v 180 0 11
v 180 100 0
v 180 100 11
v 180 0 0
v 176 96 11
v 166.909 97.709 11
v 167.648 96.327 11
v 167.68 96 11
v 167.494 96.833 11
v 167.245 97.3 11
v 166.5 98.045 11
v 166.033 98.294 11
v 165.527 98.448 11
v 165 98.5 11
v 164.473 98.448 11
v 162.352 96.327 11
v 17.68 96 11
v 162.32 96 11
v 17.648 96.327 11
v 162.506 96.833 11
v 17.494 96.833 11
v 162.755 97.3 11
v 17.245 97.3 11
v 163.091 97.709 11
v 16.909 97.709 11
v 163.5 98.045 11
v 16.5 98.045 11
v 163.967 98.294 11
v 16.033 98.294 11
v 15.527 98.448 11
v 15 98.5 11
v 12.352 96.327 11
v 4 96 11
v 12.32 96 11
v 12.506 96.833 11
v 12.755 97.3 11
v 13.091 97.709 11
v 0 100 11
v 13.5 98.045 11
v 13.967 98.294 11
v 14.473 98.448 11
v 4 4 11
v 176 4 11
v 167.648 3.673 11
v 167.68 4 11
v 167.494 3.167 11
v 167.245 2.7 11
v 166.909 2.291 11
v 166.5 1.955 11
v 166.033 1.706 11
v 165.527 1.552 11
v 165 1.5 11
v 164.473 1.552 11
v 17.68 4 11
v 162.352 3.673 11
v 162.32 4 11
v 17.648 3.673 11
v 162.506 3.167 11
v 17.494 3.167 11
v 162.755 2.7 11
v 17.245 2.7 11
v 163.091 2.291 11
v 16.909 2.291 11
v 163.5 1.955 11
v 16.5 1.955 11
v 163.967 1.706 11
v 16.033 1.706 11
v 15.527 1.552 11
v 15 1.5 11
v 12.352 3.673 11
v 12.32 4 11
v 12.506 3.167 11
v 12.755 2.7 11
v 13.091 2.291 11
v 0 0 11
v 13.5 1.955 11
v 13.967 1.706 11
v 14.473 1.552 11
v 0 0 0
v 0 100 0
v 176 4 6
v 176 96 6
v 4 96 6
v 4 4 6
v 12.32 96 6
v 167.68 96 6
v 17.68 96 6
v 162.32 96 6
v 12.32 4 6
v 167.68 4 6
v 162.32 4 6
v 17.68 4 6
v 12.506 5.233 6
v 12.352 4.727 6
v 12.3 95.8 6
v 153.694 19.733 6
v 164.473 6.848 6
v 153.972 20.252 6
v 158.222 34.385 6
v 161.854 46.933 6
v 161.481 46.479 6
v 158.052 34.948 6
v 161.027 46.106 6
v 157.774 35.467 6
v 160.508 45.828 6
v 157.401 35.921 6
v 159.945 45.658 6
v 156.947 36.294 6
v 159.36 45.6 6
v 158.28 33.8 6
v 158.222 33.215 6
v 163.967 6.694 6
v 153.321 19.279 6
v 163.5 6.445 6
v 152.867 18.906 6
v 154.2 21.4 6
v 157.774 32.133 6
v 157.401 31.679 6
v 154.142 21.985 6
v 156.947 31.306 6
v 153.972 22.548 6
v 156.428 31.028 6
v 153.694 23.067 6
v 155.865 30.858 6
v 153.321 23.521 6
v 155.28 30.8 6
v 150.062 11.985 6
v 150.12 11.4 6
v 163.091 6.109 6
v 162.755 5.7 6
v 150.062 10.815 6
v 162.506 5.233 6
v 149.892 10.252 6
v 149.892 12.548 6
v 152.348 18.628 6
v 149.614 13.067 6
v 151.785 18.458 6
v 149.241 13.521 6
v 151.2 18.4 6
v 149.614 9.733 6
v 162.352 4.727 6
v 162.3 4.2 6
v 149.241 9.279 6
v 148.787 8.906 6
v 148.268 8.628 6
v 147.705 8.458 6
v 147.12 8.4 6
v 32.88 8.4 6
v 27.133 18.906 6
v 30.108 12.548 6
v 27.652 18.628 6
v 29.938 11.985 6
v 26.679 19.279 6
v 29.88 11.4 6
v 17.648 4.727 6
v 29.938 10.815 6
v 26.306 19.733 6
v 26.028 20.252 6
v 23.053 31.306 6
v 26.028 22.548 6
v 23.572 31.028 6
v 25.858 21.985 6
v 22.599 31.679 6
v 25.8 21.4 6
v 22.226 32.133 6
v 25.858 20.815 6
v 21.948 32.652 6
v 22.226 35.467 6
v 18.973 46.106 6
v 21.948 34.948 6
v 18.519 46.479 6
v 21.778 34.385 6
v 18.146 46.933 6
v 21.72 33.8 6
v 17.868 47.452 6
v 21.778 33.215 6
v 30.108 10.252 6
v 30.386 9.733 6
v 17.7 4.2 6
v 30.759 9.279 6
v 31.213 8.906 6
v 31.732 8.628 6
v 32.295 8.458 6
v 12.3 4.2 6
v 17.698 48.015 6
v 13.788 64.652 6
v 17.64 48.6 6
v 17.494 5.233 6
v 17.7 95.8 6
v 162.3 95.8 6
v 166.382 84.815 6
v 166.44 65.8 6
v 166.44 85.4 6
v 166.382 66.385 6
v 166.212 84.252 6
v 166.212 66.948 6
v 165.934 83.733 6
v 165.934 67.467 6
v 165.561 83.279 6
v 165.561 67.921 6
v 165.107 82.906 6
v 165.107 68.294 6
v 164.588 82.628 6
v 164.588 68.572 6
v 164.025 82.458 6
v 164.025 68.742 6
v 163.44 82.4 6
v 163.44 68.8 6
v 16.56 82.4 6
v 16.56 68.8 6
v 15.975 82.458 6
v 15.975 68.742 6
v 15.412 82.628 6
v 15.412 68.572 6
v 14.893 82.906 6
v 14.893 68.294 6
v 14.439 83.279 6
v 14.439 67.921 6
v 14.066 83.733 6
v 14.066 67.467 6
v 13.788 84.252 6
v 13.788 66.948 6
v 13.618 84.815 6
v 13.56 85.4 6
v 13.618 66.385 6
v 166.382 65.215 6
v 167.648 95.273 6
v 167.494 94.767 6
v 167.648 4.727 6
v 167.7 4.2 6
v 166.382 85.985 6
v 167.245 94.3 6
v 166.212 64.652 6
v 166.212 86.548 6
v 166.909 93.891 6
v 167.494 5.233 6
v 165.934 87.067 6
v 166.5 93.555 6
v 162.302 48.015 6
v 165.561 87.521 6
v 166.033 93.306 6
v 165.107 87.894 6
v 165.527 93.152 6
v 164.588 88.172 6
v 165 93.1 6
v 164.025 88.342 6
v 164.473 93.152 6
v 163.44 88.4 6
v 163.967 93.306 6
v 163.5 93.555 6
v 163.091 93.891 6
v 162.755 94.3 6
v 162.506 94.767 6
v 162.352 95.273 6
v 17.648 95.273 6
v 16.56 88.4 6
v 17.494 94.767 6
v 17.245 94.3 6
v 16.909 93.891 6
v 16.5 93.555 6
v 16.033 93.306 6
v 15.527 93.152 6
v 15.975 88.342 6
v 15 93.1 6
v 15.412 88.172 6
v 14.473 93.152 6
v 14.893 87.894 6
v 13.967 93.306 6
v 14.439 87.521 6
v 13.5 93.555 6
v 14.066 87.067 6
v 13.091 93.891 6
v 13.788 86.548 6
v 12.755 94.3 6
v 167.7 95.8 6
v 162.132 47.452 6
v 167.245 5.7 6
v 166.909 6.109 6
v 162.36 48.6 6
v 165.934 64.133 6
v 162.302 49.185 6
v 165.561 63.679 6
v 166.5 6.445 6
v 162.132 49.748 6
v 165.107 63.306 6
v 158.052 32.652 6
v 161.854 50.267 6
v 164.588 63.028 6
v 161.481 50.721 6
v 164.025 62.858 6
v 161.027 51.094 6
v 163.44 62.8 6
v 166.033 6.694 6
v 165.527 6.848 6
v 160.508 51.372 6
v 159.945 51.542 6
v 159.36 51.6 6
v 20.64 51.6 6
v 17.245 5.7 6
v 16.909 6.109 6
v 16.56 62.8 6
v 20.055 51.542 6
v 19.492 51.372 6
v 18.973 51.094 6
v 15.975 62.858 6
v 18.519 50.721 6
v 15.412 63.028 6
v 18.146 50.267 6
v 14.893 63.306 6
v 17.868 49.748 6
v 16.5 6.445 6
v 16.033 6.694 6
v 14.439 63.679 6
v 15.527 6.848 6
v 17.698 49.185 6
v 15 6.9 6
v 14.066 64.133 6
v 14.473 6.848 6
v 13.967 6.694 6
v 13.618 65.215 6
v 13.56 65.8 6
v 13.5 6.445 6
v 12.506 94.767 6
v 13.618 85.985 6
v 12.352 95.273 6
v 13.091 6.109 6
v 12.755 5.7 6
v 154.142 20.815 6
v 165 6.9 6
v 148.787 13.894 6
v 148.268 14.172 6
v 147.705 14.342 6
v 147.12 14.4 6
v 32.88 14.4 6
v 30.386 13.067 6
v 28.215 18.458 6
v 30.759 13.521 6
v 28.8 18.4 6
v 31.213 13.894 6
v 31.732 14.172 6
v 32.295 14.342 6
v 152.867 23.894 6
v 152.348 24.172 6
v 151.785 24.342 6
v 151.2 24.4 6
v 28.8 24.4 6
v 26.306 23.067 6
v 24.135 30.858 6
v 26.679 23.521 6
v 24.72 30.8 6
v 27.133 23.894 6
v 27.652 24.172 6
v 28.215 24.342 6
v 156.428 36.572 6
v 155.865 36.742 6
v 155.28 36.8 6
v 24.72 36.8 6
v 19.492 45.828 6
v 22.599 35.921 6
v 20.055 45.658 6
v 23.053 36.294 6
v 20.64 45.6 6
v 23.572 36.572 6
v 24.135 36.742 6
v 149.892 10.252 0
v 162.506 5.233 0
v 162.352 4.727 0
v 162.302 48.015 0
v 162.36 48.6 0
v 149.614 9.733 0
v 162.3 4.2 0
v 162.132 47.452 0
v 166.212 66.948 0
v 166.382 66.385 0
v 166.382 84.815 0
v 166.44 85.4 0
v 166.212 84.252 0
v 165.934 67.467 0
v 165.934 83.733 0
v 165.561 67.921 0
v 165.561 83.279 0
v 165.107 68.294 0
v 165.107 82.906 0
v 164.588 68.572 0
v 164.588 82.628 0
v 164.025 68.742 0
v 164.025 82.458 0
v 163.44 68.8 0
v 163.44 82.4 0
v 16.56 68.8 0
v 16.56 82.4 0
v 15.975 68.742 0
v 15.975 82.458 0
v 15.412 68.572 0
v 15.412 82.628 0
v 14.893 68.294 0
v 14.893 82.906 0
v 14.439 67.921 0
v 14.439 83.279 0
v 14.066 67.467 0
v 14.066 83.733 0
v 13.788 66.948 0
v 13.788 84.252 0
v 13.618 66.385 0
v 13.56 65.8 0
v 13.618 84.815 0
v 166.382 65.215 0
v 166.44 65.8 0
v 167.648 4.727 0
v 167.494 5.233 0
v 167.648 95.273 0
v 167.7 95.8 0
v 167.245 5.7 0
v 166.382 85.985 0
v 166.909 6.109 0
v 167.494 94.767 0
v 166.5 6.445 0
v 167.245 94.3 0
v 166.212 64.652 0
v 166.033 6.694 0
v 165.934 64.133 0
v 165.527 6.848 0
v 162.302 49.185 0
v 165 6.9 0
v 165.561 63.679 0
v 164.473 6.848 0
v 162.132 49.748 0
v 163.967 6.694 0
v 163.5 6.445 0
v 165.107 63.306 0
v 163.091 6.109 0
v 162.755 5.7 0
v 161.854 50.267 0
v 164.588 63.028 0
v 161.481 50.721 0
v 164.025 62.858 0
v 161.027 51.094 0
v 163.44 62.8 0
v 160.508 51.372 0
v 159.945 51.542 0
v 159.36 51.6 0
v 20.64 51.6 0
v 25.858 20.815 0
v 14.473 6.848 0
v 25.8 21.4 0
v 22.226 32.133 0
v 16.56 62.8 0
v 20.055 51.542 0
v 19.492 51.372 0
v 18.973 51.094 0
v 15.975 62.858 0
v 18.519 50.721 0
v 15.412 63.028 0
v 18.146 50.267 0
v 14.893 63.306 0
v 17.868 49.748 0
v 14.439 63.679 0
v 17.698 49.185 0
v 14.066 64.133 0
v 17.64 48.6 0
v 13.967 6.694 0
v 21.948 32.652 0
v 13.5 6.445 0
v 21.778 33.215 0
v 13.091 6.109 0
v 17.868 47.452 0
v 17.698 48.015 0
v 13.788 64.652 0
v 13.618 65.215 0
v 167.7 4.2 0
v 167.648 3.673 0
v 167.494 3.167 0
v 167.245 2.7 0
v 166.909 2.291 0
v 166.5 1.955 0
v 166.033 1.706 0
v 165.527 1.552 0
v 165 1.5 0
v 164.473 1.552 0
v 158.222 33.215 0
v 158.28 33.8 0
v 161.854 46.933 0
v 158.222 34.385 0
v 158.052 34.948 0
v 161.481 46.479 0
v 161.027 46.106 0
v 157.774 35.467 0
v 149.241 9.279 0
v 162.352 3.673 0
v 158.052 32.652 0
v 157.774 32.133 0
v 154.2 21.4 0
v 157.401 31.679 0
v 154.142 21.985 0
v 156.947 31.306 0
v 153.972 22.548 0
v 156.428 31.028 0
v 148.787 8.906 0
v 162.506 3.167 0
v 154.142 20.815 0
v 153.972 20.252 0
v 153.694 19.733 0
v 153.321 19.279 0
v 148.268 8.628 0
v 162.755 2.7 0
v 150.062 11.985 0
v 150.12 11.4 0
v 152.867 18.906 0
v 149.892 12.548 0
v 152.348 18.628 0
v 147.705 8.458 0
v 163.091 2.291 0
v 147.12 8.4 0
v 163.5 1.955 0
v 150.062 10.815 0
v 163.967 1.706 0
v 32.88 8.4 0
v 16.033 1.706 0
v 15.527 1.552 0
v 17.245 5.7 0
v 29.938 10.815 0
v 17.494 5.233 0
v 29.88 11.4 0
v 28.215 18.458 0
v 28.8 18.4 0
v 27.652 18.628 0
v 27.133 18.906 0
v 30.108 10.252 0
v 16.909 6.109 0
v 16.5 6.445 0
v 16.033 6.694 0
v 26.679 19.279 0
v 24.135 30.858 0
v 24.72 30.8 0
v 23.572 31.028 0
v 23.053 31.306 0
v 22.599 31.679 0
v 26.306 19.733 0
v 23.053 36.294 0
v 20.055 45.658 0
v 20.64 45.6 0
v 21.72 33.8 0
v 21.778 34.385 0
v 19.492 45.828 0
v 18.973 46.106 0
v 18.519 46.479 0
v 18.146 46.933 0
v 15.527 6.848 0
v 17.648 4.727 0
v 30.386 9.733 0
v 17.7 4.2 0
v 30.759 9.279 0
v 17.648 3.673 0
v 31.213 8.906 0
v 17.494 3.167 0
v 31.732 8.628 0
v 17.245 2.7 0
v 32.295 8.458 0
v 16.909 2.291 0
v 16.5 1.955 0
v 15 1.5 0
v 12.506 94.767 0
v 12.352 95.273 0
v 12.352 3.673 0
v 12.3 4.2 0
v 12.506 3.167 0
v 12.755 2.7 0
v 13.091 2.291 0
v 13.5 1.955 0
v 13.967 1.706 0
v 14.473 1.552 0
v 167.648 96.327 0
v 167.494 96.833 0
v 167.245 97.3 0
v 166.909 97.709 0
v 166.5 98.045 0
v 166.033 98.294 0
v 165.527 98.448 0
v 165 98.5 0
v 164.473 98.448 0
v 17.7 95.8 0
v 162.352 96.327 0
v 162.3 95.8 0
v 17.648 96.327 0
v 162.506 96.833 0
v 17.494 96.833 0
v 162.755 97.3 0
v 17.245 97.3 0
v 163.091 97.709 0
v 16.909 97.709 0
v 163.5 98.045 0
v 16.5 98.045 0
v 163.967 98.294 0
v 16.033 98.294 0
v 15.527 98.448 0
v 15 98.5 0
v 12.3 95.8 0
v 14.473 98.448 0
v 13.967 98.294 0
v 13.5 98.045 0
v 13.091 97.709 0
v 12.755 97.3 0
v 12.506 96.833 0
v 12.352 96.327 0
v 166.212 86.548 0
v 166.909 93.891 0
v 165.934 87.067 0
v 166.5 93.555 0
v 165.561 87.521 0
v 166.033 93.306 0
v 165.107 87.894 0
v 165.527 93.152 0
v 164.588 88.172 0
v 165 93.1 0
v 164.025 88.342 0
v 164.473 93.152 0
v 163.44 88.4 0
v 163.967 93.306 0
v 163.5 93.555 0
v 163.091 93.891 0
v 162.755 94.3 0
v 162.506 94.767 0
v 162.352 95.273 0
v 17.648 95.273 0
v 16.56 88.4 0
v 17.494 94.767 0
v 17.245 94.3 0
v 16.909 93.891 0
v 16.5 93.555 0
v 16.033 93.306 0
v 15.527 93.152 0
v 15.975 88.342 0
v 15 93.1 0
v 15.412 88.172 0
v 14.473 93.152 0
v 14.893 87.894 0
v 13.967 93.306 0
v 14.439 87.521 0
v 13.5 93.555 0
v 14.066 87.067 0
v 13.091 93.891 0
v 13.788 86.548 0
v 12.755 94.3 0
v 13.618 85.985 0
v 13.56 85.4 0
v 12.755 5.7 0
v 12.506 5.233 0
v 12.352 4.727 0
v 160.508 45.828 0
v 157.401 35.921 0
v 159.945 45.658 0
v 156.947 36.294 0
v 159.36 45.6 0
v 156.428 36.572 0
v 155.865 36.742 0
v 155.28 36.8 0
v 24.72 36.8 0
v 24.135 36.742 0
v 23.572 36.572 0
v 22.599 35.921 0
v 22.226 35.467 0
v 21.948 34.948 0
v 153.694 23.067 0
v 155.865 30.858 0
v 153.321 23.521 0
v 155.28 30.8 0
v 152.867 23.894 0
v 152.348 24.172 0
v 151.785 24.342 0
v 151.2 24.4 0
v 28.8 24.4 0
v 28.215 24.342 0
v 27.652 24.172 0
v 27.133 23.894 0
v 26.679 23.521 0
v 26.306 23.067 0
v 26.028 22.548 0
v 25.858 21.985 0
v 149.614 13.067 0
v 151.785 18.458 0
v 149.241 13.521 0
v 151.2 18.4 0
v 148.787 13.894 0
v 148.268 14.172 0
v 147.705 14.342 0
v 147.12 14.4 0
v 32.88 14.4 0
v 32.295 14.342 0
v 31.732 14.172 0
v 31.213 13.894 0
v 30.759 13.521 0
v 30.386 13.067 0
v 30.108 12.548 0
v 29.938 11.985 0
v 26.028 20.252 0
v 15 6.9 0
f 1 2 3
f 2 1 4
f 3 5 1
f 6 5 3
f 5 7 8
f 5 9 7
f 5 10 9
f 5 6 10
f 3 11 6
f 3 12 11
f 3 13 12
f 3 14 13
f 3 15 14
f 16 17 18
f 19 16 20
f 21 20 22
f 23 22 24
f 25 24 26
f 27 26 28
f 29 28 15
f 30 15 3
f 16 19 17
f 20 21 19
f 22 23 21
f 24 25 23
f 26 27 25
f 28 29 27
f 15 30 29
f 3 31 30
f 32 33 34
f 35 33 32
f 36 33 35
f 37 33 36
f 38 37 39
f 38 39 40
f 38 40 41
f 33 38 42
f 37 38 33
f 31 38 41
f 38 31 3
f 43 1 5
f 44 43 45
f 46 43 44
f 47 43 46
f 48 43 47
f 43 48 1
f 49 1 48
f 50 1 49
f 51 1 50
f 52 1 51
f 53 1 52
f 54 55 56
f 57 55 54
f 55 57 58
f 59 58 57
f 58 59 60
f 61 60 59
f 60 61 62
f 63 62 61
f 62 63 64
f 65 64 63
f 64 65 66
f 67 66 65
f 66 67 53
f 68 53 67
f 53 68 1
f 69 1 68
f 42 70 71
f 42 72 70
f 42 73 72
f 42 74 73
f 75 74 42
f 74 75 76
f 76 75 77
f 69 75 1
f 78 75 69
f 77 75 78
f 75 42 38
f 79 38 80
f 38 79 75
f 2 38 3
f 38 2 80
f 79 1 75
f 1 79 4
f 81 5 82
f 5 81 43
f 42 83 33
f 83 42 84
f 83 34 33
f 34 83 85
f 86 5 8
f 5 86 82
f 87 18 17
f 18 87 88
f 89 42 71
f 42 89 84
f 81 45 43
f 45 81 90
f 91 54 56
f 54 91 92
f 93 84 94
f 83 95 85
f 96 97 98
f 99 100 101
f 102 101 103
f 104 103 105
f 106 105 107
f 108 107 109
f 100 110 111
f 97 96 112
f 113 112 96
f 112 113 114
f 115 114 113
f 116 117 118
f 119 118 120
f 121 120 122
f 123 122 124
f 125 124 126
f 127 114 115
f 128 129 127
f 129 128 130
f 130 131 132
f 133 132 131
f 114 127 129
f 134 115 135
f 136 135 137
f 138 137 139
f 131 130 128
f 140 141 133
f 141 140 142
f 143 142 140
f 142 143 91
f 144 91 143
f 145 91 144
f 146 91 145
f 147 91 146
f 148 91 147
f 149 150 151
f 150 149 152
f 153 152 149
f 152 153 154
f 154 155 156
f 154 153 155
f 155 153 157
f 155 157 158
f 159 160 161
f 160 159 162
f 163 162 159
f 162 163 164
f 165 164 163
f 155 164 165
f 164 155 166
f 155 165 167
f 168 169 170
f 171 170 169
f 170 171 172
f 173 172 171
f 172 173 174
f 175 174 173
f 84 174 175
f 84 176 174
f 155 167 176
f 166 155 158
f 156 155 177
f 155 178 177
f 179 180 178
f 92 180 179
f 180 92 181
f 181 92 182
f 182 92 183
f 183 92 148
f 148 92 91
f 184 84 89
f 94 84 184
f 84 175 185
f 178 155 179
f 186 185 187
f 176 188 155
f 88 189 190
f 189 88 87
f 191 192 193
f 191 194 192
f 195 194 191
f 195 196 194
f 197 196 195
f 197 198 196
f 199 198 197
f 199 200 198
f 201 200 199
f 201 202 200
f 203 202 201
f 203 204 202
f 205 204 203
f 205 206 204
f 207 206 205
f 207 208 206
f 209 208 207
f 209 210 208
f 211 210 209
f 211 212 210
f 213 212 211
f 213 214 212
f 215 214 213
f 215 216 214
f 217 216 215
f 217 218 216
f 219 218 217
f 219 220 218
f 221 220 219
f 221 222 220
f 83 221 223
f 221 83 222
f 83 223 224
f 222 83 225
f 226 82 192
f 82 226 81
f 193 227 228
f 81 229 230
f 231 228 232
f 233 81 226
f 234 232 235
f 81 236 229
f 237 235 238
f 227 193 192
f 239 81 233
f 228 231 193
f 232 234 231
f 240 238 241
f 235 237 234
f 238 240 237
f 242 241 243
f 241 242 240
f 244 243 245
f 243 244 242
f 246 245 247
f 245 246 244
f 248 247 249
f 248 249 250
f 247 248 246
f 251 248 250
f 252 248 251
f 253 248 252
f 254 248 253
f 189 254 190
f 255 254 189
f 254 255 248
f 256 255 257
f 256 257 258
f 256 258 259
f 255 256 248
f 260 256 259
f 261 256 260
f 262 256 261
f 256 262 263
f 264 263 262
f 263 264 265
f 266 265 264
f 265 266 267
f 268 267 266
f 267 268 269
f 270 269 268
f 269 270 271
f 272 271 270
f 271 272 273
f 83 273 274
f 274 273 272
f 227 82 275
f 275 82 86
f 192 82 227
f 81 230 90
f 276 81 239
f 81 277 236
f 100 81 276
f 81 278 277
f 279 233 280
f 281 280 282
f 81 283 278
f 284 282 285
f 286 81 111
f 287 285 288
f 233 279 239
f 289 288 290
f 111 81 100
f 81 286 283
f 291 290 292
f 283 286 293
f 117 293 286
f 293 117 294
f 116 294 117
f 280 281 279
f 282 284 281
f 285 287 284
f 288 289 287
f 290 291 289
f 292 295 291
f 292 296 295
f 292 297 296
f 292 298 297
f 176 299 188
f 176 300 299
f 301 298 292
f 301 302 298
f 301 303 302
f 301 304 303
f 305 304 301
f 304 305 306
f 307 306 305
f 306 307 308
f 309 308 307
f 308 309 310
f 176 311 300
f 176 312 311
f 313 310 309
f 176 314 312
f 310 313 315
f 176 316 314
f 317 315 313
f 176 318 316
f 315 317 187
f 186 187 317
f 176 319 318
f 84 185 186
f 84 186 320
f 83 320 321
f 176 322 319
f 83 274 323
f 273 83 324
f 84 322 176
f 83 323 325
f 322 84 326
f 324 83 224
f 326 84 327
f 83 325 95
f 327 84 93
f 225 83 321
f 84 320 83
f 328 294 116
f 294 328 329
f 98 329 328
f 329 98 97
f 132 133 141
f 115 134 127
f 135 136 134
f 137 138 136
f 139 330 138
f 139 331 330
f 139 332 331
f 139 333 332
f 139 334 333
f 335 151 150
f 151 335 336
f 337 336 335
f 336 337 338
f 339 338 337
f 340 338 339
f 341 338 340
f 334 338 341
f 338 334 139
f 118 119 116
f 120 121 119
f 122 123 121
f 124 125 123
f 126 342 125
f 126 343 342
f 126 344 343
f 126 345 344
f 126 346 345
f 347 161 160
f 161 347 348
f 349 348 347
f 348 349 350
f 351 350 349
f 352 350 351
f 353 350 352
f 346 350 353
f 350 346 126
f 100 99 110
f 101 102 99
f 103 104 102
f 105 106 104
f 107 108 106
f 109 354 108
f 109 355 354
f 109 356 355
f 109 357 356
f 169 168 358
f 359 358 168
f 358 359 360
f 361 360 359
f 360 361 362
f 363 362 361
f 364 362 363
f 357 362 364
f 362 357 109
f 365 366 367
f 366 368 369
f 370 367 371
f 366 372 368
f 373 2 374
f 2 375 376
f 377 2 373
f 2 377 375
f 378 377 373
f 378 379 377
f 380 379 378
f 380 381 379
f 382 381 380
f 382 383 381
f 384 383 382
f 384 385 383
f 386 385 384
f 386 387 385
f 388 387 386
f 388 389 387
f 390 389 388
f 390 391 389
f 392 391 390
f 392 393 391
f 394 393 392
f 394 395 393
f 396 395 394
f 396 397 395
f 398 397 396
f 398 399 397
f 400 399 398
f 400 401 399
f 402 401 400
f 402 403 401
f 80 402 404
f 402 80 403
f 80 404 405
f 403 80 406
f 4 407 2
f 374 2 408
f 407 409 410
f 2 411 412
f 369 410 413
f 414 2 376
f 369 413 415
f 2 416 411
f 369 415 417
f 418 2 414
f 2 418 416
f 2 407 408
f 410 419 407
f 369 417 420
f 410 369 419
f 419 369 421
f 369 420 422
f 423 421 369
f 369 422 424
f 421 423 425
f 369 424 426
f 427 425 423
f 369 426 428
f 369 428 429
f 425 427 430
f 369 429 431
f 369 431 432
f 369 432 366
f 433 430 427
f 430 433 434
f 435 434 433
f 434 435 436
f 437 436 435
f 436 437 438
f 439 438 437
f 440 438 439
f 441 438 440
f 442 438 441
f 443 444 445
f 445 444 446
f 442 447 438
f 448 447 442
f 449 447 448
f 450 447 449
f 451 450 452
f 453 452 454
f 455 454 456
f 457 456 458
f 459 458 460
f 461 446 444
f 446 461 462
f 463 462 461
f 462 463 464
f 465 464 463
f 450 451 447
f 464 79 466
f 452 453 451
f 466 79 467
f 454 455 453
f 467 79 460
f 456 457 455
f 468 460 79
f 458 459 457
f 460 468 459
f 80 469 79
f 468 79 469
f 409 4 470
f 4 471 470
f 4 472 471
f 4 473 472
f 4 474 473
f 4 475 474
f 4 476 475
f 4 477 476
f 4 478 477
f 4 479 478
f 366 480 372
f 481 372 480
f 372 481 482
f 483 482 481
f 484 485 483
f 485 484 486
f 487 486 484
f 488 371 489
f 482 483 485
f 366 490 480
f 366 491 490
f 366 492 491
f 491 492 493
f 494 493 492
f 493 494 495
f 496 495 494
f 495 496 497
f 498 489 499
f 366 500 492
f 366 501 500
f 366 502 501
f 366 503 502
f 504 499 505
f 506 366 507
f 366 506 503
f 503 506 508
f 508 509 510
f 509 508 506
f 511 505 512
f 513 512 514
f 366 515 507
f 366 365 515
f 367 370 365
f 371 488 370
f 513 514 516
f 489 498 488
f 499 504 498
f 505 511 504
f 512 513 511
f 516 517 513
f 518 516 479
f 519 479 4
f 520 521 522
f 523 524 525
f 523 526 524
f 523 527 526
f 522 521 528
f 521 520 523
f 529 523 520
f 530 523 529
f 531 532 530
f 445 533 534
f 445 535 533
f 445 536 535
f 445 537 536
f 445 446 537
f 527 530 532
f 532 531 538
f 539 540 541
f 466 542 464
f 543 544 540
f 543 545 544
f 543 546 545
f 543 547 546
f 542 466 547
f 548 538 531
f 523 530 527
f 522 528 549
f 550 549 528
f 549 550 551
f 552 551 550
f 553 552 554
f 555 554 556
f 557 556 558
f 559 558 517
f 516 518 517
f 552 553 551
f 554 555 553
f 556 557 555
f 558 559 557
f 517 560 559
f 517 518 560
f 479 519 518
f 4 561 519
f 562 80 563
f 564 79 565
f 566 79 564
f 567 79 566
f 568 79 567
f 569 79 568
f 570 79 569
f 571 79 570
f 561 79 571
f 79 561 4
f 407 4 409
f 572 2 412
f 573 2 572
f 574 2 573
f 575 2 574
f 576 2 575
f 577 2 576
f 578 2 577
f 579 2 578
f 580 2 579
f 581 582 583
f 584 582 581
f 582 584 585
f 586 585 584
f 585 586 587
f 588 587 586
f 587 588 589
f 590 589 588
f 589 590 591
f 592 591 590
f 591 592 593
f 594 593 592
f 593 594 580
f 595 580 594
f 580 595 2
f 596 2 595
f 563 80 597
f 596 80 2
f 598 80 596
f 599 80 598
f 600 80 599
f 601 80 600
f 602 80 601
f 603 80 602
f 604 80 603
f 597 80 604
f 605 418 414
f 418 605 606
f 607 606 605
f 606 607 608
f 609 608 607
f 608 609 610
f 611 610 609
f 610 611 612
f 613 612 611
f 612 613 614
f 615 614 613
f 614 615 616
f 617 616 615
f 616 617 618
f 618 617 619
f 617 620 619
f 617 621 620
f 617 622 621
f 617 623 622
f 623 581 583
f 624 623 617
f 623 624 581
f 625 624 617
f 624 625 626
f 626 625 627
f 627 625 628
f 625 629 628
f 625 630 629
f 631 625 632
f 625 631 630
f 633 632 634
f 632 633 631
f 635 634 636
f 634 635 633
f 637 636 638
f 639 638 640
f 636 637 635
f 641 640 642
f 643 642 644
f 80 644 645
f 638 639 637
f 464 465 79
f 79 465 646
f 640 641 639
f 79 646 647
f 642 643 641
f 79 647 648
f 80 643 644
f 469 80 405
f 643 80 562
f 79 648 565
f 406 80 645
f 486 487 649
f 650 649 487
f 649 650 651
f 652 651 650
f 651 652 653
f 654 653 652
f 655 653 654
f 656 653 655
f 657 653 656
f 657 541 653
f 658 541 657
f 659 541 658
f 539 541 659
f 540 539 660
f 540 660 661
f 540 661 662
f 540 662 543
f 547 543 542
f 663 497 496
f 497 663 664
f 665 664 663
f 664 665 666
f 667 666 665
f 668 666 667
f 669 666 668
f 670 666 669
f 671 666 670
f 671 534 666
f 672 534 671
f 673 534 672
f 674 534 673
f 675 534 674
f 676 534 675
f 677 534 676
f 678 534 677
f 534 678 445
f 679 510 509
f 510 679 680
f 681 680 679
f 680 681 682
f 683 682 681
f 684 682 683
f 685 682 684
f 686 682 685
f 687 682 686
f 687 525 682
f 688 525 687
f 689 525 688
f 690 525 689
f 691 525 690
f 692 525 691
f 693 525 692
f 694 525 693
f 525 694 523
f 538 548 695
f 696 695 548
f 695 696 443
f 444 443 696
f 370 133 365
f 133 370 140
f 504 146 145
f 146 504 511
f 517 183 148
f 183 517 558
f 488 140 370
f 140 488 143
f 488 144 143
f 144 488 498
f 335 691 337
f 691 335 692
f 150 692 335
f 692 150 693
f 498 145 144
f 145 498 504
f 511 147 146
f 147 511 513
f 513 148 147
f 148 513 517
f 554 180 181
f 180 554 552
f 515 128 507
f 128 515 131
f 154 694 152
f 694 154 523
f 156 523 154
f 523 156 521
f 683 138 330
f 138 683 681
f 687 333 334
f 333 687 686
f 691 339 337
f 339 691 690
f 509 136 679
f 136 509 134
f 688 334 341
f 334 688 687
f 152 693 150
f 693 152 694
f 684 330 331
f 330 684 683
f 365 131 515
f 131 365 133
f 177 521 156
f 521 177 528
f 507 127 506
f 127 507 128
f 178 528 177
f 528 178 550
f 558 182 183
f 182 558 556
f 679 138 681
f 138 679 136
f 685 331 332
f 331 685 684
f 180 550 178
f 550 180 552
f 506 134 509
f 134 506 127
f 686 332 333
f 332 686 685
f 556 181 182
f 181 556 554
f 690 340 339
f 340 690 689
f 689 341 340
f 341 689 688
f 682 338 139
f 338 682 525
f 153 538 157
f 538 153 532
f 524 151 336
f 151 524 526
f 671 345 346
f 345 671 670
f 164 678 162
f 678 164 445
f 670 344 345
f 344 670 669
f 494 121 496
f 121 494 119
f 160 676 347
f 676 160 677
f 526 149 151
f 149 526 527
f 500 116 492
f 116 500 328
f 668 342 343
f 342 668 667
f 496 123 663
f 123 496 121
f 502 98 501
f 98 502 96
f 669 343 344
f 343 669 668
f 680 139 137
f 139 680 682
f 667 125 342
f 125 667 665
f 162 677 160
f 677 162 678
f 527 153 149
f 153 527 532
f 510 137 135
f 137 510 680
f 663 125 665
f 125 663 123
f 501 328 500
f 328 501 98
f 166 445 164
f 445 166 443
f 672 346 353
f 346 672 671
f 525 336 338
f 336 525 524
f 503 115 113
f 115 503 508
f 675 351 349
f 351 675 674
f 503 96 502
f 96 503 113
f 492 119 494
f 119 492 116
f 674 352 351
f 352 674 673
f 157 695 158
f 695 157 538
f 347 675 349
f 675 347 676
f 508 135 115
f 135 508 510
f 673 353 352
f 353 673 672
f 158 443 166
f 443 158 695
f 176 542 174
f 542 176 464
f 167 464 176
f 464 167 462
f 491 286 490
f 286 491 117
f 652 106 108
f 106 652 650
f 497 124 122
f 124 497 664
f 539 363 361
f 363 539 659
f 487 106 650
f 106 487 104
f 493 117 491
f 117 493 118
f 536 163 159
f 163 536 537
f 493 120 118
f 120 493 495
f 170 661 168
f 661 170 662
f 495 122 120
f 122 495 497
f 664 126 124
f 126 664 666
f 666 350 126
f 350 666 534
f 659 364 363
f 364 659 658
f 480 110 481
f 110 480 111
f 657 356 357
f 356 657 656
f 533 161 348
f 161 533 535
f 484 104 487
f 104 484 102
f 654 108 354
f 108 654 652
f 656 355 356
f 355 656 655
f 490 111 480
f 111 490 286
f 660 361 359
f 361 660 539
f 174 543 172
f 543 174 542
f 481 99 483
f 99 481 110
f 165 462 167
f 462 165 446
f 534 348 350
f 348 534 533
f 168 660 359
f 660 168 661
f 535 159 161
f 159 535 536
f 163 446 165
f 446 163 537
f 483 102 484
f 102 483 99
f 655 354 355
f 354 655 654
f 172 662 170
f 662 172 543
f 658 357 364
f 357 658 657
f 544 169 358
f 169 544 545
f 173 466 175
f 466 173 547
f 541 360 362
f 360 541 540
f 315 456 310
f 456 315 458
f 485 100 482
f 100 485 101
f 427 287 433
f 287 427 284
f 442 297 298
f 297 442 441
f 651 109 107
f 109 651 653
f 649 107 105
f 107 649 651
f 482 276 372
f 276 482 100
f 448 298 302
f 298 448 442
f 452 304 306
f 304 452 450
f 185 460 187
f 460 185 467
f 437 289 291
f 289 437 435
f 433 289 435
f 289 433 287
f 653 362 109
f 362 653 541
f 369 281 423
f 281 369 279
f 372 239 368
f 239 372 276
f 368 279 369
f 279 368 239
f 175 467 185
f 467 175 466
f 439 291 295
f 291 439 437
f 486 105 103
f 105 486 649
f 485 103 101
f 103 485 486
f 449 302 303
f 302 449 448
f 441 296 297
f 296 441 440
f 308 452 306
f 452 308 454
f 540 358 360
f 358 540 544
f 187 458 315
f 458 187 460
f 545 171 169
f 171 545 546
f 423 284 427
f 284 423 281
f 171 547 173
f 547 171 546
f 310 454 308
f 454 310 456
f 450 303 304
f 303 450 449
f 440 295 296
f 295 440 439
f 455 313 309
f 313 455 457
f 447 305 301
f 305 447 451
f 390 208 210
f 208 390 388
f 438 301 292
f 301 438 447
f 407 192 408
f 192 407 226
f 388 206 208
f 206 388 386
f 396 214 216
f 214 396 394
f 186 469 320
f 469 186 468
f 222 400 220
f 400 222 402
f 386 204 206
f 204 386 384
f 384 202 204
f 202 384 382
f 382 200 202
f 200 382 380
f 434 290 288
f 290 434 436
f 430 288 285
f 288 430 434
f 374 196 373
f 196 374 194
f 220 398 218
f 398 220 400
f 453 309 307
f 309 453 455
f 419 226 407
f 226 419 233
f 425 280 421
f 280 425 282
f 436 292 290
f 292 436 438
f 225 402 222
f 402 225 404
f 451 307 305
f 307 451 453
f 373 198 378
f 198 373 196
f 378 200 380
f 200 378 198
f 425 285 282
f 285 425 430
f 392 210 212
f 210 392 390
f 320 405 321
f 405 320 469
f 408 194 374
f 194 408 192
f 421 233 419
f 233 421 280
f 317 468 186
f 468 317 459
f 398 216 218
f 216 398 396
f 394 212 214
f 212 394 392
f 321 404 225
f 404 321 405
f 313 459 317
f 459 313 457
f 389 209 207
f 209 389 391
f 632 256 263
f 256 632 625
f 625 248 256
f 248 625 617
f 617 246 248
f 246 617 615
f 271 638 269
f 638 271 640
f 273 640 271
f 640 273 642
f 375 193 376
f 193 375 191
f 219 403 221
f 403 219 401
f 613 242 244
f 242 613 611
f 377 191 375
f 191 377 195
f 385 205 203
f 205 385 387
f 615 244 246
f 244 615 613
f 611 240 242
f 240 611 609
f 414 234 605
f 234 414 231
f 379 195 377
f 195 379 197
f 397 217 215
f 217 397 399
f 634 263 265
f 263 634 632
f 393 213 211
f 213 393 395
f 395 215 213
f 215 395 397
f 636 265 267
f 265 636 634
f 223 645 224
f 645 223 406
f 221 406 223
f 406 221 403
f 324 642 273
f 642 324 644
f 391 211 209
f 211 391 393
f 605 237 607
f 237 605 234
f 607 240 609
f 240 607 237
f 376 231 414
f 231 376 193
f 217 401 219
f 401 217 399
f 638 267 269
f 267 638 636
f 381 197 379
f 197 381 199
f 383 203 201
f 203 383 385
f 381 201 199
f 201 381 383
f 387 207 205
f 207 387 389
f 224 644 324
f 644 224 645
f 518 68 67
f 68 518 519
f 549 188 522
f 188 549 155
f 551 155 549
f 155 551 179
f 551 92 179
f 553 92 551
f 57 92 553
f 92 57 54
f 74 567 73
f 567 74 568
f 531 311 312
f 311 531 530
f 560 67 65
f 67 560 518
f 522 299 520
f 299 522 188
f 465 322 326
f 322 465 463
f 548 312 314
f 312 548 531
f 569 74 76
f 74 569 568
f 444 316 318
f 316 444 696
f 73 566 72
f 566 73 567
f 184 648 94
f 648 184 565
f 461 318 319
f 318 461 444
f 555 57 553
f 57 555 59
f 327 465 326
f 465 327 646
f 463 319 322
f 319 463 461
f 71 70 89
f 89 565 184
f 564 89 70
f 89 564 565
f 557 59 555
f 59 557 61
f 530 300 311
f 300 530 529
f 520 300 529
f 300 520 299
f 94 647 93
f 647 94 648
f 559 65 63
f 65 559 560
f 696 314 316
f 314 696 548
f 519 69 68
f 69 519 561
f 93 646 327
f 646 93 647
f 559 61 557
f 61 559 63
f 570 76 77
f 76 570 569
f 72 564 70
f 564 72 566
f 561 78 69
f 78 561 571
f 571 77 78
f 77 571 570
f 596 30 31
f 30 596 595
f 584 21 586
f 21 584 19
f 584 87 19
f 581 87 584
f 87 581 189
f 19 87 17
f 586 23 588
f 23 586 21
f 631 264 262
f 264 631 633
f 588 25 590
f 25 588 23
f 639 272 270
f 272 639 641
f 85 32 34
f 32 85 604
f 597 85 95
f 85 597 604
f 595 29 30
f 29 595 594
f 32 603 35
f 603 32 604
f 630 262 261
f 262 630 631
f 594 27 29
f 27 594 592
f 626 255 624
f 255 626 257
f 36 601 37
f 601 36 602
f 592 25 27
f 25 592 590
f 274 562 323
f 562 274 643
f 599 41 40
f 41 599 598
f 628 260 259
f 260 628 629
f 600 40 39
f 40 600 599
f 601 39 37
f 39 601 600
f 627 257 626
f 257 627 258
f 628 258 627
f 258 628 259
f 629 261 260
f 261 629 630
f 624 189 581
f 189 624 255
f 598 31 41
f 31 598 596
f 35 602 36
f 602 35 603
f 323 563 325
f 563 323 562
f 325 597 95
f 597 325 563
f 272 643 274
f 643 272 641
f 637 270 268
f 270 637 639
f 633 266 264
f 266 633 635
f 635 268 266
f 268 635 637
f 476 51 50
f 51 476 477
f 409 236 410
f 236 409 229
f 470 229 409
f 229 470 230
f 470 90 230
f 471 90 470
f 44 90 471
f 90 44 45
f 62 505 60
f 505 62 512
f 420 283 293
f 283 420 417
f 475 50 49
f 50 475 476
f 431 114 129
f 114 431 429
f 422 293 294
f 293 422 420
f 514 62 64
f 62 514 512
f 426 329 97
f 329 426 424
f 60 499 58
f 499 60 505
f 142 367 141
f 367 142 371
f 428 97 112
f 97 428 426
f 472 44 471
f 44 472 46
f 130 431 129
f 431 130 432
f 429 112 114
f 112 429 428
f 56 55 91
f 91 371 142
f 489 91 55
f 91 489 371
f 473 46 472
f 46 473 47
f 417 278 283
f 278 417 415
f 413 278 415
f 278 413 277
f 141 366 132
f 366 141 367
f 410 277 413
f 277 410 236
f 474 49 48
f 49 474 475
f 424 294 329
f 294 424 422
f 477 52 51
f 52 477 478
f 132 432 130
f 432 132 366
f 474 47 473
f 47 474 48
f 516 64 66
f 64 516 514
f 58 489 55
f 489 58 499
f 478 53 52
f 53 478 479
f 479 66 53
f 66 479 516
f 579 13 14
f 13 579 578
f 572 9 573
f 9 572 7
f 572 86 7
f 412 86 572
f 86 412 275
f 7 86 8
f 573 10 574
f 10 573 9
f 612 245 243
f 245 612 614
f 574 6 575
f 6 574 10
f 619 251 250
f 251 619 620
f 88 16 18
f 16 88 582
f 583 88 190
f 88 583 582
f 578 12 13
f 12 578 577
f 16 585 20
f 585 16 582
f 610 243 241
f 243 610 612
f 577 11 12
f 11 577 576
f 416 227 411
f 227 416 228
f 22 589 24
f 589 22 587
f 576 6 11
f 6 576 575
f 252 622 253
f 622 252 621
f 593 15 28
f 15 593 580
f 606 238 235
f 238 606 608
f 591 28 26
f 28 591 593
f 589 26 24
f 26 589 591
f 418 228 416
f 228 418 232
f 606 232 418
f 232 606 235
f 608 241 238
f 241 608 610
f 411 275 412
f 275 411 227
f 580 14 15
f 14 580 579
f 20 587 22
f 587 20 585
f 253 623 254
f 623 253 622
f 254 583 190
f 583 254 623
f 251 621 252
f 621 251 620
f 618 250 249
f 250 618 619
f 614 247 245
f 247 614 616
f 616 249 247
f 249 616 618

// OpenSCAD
$fn = 32;

// ----------------------------------------------------------------------
// Slotted panel: 180 x 100 mm, 6 рядов of slots
// ----------------------------------------------------------------------

// --- parameters (mm) ---
panel_w = 180;            // panel width
panel_d = 100;            // panel depth
thick = 6;                // panel thickness
slot_w = 6;               // slot width
pitch0 = 10;              // first row pitch
pitch_step = 2.4;         // pitch increase per row
margin = 8.4;             // margin around the slot field
rows = 6;                 // number of slot rows
mount_d = 5.4;            // mounting holes
mount_x = 75;             // mounting hole offset
rim_h = 11;               // rim height
rim_t = 4;                // rim wall thickness

difference() {
  union() {
    cube([panel_w, panel_d, thick]);
    translate([0, 0, thick - 1]) difference() {
      cube([panel_w, panel_d, rim_h - thick + 1]);
      translate([rim_t, rim_t, -2.5]) cube([panel_w - 2 * rim_t, panel_d - 2 * rim_t, rim_h - thick + 6]);
    }
  }
  /* slot rows: stadium shaped cutters, 2.5 mm clear of both faces */
  /* row 0: pitch 10, length 114.24 */
  hull() {
    translate([32.88, 11.4, -2.5]) cylinder(h = thick + 5, d = slot_w);
    translate([147.12, 11.4, -2.5]) cylinder(h = thick + 5, d = slot_w);
  }
  /* row 1: pitch 12.4, length 122.4 */
  hull() {
    translate([28.8, 21.4, -2.5]) cylinder(h = thick + 5, d = slot_w);
    translate([151.2, 21.4, -2.5]) cylinder(h = thick + 5, d = slot_w);
  }
  /* row 2: pitch 14.8, length 130.56 */
  hull() {
    translate([24.72, 33.8, -2.5]) cylinder(h = thick + 5, d = slot_w);
    translate([155.28, 33.8, -2.5]) cylinder(h = thick + 5, d = slot_w);
  }
  /* row 3: pitch 17.2, length 138.72 */
  hull() {
    translate([20.64, 48.6, -2.5]) cylinder(h = thick + 5, d = slot_w);
    translate([159.36, 48.6, -2.5]) cylinder(h = thick + 5, d = slot_w);
  }
  /* row 4: pitch 19.6, length 146.88 */
  hull() {
    translate([16.56, 65.8, -2.5]) cylinder(h = thick + 5, d = slot_w);
    translate([163.44, 65.8, -2.5]) cylinder(h = thick + 5, d = slot_w);
  }
  /* row 5: pitch 22, length 146.88 */
  hull() {
    translate([16.56, 85.4, -2.5]) cylinder(h = thick + 5, d = slot_w);
    translate([163.44, 85.4, -2.5]) cylinder(h = thick + 5, d = slot_w);
  }
  translate([15, 4.2, -2.5]) cylinder(h = 16, d = mount_d);
  translate([15, 95.8, -2.5]) cylinder(h = 16, d = mount_d);
  translate([165, 4.2, -2.5]) cylinder(h = 16, d = mount_d);
  translate([165, 95.8, -2.5]) cylinder(h = 16, d = mount_d);
}
